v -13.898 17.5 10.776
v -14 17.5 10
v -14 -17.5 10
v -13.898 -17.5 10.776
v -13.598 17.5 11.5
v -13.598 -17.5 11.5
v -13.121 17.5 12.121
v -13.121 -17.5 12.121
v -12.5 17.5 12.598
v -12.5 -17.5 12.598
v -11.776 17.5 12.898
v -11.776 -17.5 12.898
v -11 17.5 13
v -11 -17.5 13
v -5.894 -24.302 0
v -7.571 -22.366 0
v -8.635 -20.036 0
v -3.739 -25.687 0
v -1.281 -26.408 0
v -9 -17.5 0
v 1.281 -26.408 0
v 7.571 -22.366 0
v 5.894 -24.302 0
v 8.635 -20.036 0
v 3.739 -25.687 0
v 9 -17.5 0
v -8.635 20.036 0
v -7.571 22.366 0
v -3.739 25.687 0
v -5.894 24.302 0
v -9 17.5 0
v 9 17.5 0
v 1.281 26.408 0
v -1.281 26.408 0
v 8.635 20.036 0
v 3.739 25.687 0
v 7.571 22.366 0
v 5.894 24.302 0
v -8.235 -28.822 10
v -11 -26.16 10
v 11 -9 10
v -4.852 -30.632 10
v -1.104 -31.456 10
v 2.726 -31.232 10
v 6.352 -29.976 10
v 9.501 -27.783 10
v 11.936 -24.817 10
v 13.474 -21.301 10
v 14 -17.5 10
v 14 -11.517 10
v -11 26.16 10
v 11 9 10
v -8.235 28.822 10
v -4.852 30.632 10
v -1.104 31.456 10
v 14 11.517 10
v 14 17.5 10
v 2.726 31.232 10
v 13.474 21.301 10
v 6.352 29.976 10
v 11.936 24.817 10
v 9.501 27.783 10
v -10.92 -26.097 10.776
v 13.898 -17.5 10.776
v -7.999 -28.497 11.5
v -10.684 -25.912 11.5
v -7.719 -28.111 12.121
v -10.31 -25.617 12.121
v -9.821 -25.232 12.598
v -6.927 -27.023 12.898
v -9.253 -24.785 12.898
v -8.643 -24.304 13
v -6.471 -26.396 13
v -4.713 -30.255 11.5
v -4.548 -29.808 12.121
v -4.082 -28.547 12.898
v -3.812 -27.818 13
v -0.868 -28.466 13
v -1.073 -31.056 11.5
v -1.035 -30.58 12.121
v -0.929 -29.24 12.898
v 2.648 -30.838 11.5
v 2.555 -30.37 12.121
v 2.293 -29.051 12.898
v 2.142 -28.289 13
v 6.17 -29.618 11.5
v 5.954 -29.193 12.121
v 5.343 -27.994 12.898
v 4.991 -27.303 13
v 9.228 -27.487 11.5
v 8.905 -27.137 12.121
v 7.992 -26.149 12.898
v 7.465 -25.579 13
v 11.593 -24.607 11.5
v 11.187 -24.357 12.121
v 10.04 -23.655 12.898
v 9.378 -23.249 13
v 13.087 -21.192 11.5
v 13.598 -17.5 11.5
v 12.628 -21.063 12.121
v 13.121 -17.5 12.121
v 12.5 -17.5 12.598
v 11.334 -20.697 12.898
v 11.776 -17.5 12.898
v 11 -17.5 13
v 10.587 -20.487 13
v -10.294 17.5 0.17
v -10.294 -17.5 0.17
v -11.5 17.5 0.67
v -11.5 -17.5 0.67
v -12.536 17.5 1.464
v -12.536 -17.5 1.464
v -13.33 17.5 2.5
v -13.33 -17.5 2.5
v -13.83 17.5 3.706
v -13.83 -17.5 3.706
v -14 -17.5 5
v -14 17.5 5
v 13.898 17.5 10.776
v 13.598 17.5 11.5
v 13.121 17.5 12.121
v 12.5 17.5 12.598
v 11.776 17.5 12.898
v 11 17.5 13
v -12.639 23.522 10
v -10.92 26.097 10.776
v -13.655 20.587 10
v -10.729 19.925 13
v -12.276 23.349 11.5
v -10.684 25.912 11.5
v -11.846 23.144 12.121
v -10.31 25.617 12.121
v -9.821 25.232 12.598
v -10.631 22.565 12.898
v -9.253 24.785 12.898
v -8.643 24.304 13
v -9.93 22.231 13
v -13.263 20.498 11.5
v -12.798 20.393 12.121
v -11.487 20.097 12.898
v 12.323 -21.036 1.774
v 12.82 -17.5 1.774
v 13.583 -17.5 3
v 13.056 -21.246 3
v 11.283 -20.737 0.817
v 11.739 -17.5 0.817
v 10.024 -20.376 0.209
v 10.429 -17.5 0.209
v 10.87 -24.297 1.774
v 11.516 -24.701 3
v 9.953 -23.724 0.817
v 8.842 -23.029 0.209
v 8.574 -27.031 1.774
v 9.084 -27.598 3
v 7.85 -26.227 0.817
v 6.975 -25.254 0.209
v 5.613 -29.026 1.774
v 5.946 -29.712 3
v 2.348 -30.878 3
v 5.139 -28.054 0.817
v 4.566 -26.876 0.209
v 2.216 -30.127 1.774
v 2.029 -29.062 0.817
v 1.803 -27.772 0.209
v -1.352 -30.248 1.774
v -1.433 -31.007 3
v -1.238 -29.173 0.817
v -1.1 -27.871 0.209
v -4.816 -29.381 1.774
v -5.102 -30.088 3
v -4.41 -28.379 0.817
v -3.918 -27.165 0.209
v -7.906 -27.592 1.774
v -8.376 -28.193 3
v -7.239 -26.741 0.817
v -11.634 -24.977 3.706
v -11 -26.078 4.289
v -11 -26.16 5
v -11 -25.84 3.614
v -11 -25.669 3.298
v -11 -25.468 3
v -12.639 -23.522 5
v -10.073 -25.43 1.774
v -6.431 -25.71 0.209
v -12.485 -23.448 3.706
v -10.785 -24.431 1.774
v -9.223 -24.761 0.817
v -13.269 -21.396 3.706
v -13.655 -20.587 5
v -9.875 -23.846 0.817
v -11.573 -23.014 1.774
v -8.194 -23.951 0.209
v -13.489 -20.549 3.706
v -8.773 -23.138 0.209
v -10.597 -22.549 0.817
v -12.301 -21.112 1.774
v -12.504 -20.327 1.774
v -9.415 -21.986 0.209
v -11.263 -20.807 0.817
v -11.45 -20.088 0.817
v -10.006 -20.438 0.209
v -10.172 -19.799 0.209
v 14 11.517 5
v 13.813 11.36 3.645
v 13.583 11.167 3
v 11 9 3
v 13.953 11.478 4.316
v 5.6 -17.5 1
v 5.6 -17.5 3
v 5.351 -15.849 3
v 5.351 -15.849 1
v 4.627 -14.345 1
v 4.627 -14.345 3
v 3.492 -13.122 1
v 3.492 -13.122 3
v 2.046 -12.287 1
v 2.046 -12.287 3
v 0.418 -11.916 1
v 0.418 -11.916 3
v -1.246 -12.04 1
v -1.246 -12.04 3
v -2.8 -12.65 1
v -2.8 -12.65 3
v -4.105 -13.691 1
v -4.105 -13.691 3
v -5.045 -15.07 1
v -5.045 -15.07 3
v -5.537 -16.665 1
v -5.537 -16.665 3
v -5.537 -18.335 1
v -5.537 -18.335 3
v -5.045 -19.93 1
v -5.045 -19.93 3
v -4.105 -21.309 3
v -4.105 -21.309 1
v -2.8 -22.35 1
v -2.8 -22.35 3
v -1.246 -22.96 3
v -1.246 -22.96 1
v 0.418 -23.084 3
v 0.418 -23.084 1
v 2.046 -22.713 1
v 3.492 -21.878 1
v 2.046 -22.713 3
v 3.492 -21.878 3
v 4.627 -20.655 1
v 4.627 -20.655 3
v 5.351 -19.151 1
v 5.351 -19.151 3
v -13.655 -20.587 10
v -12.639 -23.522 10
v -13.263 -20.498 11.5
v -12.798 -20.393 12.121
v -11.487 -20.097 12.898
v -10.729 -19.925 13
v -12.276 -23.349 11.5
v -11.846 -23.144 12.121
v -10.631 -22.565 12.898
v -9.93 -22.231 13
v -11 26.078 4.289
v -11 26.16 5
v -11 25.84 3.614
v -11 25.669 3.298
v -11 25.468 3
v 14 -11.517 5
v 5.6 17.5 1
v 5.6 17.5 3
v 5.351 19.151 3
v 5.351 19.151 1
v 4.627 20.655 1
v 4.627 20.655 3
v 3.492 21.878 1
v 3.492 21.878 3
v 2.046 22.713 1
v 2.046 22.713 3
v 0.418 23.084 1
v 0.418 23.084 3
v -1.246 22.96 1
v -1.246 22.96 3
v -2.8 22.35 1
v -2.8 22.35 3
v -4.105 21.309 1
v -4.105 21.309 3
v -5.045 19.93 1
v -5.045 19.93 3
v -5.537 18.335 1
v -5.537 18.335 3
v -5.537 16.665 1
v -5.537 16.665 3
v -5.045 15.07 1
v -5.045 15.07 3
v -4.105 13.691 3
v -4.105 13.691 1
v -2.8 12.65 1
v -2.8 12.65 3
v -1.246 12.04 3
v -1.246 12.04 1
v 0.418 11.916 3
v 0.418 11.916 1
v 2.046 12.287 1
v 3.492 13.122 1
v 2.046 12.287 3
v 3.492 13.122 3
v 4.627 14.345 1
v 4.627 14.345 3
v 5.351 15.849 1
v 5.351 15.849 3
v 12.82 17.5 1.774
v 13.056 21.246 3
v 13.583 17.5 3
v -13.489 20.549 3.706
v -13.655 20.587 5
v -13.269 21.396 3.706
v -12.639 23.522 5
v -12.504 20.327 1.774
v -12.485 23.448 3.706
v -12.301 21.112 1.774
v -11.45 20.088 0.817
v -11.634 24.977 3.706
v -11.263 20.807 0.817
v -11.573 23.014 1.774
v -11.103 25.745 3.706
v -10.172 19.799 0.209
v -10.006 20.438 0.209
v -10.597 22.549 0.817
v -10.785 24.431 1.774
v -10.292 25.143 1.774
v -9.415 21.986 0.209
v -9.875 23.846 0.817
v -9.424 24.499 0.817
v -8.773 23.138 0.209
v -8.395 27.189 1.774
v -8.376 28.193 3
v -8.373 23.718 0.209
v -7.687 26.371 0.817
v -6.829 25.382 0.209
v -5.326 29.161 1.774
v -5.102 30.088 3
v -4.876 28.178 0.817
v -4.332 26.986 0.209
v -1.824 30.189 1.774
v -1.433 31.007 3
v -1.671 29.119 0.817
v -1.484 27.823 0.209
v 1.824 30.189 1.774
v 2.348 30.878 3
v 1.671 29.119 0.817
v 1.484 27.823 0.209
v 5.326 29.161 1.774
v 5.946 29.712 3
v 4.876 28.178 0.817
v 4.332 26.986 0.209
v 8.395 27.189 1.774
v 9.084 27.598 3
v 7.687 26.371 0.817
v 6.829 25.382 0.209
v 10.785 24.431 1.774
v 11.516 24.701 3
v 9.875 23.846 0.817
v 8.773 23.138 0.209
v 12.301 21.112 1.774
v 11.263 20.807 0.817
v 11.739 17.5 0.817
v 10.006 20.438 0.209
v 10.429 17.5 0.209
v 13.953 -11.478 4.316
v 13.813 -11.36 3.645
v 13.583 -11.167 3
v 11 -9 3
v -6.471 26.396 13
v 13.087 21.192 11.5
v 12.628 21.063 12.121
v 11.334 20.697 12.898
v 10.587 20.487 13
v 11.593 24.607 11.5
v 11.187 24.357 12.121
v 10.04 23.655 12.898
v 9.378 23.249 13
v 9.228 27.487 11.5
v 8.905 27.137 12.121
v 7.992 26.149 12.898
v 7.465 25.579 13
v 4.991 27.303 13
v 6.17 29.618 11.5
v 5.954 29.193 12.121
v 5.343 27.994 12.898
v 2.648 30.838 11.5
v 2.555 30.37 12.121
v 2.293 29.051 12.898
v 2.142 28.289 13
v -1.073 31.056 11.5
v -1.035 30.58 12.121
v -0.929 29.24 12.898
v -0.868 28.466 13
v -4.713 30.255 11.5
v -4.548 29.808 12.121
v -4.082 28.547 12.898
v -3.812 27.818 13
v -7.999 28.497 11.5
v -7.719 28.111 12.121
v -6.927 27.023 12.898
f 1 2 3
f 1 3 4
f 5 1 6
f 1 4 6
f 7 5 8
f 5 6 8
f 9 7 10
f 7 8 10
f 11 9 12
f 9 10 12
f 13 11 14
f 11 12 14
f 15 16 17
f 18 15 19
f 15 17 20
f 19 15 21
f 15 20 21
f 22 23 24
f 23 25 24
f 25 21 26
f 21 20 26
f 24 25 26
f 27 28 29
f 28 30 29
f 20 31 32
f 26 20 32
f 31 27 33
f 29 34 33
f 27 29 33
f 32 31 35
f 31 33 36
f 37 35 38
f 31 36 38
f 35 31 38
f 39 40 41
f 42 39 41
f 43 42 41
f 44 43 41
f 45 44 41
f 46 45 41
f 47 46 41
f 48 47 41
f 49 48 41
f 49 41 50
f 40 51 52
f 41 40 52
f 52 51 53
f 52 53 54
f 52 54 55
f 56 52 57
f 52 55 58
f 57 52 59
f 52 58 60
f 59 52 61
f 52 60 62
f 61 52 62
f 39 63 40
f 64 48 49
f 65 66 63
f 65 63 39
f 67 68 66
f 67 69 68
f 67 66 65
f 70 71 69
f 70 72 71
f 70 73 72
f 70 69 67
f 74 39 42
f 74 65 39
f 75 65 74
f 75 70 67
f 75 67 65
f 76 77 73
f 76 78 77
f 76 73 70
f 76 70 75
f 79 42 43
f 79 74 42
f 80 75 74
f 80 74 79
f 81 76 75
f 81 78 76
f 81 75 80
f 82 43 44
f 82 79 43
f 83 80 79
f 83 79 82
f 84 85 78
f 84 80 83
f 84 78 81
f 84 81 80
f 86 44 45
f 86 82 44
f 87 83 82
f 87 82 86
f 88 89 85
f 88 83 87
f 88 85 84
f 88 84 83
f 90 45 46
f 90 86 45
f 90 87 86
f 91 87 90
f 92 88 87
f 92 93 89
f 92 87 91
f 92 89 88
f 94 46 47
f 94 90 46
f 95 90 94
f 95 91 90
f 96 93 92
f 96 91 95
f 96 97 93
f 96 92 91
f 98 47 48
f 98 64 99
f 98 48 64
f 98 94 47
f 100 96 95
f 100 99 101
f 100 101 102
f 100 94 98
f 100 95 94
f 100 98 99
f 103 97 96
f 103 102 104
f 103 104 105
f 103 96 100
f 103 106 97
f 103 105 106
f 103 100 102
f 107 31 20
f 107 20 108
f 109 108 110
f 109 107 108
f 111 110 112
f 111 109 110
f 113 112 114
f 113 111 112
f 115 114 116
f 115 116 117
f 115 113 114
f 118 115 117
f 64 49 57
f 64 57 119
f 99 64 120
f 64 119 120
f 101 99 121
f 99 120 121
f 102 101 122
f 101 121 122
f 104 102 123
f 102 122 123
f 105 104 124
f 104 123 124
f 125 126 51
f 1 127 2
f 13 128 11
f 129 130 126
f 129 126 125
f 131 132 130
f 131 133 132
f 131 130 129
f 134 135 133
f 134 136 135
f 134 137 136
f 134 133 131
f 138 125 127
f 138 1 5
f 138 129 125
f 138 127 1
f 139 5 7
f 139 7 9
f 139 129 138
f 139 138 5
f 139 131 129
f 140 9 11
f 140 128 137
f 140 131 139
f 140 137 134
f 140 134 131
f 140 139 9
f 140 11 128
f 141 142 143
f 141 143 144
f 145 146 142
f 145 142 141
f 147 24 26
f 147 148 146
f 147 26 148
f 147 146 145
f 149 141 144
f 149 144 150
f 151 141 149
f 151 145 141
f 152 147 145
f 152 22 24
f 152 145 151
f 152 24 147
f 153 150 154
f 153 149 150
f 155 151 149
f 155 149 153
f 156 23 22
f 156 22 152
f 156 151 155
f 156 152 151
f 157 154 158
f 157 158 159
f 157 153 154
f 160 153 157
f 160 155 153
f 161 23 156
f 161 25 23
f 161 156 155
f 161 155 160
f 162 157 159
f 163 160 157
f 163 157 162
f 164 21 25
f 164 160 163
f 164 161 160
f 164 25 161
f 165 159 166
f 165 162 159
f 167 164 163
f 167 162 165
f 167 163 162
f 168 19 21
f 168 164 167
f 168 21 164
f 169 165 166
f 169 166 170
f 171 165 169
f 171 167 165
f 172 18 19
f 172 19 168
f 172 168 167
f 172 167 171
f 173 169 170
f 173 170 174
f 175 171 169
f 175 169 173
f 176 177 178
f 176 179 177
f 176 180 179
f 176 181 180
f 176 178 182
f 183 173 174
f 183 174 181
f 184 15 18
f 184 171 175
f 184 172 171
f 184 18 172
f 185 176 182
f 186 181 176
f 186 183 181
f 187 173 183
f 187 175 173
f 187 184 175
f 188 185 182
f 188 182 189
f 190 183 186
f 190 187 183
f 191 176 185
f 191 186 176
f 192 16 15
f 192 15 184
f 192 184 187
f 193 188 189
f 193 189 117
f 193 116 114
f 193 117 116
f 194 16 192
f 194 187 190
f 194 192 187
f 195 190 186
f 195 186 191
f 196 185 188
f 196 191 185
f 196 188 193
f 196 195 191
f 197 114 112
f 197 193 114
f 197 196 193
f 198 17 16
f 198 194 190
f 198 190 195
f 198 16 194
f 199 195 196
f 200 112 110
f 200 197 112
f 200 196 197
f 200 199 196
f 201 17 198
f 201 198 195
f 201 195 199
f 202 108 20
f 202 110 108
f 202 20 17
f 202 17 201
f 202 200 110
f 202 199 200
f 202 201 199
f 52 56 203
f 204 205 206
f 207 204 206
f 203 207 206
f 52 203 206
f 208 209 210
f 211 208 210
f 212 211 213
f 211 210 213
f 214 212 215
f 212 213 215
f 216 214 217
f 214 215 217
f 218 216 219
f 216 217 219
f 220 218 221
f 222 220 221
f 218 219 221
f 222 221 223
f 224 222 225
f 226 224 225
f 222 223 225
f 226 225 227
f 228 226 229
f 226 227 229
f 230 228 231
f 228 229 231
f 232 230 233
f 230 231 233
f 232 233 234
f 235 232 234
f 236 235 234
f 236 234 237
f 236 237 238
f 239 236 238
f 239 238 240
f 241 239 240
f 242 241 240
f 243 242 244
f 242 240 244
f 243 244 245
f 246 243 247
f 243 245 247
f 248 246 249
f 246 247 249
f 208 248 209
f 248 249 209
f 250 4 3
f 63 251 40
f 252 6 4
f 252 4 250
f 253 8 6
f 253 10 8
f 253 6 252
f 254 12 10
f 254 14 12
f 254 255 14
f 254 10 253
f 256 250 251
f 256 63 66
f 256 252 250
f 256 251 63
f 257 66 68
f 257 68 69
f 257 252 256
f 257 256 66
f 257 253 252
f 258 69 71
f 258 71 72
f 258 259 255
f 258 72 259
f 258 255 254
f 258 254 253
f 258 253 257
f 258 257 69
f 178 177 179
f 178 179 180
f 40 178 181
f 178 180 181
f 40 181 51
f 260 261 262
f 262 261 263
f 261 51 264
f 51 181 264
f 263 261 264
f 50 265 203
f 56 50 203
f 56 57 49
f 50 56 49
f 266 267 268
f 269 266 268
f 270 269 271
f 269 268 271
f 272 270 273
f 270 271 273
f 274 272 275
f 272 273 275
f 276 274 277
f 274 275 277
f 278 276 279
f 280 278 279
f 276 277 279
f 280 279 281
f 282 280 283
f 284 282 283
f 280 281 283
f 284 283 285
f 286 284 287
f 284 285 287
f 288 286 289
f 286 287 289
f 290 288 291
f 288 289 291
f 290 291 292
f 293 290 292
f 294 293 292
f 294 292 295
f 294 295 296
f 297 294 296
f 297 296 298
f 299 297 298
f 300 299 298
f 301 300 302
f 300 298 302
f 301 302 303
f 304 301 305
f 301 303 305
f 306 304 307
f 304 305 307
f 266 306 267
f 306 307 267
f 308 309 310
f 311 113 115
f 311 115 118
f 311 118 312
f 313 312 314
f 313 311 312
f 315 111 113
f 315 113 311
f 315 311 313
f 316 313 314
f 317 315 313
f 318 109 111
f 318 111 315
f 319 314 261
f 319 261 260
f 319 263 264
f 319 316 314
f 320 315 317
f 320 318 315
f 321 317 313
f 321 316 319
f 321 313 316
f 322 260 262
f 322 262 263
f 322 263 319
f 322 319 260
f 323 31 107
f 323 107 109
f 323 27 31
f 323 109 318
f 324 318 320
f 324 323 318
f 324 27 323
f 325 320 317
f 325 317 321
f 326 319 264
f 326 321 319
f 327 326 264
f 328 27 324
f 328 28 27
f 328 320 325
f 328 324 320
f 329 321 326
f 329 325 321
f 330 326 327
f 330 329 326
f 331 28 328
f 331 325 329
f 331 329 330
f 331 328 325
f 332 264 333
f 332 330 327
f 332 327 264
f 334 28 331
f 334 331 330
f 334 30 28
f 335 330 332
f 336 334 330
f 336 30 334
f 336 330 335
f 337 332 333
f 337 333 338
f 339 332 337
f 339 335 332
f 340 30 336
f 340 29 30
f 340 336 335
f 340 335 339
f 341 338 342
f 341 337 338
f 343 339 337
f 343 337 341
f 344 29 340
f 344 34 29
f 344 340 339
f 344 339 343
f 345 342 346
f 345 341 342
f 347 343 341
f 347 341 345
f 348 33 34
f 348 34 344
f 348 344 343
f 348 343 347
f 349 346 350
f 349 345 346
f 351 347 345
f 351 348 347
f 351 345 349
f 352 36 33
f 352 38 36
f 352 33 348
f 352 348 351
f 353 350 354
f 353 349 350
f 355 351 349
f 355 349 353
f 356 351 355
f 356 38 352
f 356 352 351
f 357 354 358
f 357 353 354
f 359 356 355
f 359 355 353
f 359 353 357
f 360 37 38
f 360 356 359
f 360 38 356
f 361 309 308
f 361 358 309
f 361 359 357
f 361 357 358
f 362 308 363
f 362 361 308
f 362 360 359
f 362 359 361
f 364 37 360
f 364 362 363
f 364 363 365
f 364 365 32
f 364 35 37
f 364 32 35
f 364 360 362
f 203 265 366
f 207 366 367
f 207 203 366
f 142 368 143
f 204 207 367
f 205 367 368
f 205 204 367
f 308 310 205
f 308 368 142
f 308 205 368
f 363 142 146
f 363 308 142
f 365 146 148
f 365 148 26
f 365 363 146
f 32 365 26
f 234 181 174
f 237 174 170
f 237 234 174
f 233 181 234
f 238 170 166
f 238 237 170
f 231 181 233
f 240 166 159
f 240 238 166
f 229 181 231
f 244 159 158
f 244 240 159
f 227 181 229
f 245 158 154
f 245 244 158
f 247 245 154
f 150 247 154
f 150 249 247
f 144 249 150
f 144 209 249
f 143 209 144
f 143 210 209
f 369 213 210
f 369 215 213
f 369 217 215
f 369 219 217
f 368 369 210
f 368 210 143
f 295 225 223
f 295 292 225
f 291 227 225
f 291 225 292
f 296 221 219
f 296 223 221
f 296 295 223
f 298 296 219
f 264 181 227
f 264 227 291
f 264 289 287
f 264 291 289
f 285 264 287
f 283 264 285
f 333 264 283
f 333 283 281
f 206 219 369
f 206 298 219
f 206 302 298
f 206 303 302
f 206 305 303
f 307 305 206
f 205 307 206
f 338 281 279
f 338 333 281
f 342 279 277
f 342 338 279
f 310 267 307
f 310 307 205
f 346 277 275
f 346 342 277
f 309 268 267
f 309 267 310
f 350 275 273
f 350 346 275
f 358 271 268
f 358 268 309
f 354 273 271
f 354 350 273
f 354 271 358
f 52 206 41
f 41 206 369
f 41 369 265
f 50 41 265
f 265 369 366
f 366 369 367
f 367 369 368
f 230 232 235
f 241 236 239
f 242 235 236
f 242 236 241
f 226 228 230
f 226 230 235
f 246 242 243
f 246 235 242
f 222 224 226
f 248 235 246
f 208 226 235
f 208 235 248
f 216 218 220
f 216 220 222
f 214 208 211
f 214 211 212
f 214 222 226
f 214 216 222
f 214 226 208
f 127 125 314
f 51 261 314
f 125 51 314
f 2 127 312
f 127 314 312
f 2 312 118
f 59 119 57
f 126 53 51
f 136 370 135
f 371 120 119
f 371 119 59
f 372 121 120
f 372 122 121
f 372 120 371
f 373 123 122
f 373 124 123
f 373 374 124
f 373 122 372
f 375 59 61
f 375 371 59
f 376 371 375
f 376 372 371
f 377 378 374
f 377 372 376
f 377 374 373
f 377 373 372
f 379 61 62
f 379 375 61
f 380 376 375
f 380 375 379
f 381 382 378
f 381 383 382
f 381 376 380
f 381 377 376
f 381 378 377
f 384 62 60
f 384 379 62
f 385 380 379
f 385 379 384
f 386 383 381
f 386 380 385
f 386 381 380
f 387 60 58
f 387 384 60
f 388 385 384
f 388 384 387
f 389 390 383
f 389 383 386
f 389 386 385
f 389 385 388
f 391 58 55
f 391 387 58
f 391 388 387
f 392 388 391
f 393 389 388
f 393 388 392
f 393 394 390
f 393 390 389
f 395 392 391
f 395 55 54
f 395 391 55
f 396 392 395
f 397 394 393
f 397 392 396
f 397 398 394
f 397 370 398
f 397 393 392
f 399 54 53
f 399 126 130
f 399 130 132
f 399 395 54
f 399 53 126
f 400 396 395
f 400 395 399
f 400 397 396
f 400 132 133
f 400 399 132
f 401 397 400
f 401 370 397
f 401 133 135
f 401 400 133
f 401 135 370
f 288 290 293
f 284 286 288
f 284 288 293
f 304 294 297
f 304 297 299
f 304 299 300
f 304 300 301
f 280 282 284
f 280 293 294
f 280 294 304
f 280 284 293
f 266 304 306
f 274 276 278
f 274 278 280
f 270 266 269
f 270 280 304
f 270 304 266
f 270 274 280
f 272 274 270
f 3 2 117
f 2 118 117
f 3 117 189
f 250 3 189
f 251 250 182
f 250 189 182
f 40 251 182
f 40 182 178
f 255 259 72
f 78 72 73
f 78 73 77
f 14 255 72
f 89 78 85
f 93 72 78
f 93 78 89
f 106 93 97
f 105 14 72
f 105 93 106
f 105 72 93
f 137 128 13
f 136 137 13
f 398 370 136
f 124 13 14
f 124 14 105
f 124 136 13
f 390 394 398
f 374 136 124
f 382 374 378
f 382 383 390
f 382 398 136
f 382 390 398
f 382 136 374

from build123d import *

# Parameters (mm, degrees)
F1_DEPTH    = 3
F2_R        = 5.6
F3_DEPTH    = 2
F5_DEPTH    = 10
F7_DEPTH    = 3
F8_R        = 2.99999
F9_T1_DEPTH = 35
F9_T4_ANGLE = 180
F9_T6_ANGLE = 180


# Not quite as in the source:
# - a fillet or chamfer that OpenCascade refuses, or shapes differently, is made with other operations: its cross-section is extruded or revolved along the edge and cut away or added
# - a fillet or chamfer is up to 0.001 mm smaller than in the source, because OpenCascade refuses the exact size


with BuildPart() as f1:
    # F0 (on Top) → F1 (new body)
    with BuildSketch(Plane.XY):
        with BuildLine():
            Line((14, -17.5), (14, 17.5))
            ThreePointArc((14, 17.5), (0, 31.5), (-14, 17.5))
            Line((-14, 17.5), (-14, -17.5))
            ThreePointArc((-14, -17.5), (0, -31.5), (14, -17.5))
        make_face()
    extrude(amount=F1_DEPTH)

    # F2 (on face) → F3 (cut)
    with BuildSketch(Plane.XY.offset(3)):
        with Locations((0, 17.5)):
            Circle(F2_R)
        with Locations((0, -17.5)):
            Circle(F2_R)
    extrude(amount=-F3_DEPTH, mode=Mode.SUBTRACT)

    # F4 (on Top) → F5 (join)
    with BuildSketch(Plane.XY):
        with BuildLine():
            Line((-11, -26.1602540378), (-11, 26.1602540378))
            ThreePointArc((-11, 26.1602540378), (-13.2287565553, 22.082575695), (-14, 17.5))
            Line((-14, 17.5), (-14, -17.5))
            ThreePointArc((-14, -17.5), (-13.2287565553, -22.082575695), (-11, -26.1602540378))
        make_face()
        Polygon((14, -11.5172988935), (14, 11.5172988935), (11, 9), (11, -9), align=None)
    extrude(amount=F5_DEPTH)

    # F6 (on face) → F7 (join)
    with BuildSketch(Plane.XY.offset(10)):
        with BuildLine():
            Line((14, -17.5), (14, 17.5))
            ThreePointArc((14, 17.5), (4.582575695, 30.7287565553), (-11, 26.1602540378))
            Line((-11, 26.1602540378), (-11, -26.1602540378))
            ThreePointArc((-11, -26.1602540378), (4.582575695, -30.7287565553), (14, -17.5))
        make_face()
        with BuildLine():
            Line((-11, -26.1602540378), (-11, 26.1602540378))
            ThreePointArc((-11, 26.1602540378), (-13.2287565553, 22.082575695), (-14, 17.5))
            Line((-14, 17.5), (-14, -17.5))
            ThreePointArc((-14, -17.5), (-13.2287565553, -22.082575695), (-11, -26.1602540378))
        make_face()
    extrude(amount=F7_DEPTH)

    # F8 (radius 3 in the source; OpenCascade refuses exactly that, so slightly less here)
    f8_edges = [f1.edges().sort_by_distance(p)[0] for p in [
        (14, 0, 13),
        (0, 31.5, 13),
        (-14, 0, 13),
        (0, -31.5, 13),
    ]]
    fillet(f8_edges, radius=F8_R)

    # F9: fillet of radius 5 on 4 edges, made by hand

    # F9_s2 → F9_t1 (cut)
    with BuildSketch(Plane.XZ.offset(-17.5)):
        with BuildLine():
            ThreePointArc((14, 5), (12.5355339059, 1.4644660941), (9, 0))
            Line((9, 0), (14, 0))
            Line((14, 0), (14, 5))
        make_face()
        with BuildLine():
            ThreePointArc((-9, 0), (-12.5355339059, 1.4644660941), (-14, 5))
            Line((-14, 5), (-14, 0))
            Line((-14, 0), (-9, 0))
        make_face()
    extrude(amount=F9_T1_DEPTH, mode=Mode.SUBTRACT)

    # F9_s3 → F9_t4 (revolve, cut)
    with BuildSketch(Plane.XZ.offset(17.5)):
        with BuildLine():
            ThreePointArc((14, 5), (12.5355339059, 1.4644660941), (9, 0))
            Line((9, 0), (14, 0))
            Line((14, 0), (14, 5))
        make_face()
    revolve(axis=Axis((0, -17.5, 0), (0, 0, -1)), revolution_arc=F9_T4_ANGLE, mode=Mode.SUBTRACT)

    # F9_s5 → F9_t6 (revolve, cut)
    with BuildSketch(Plane.XZ.offset(-17.5)):
        with BuildLine():
            ThreePointArc((-14, 5), (-12.5355339059, 1.4644660941), (-9, 0))
            Line((-9, 0), (-14, 0))
            Line((-14, 0), (-14, 5))
        make_face()
    revolve(axis=Axis((0, 17.5, 0), (0, 0, -1)), revolution_arc=F9_T6_ANGLE, mode=Mode.SUBTRACT)


solid = f1.part
